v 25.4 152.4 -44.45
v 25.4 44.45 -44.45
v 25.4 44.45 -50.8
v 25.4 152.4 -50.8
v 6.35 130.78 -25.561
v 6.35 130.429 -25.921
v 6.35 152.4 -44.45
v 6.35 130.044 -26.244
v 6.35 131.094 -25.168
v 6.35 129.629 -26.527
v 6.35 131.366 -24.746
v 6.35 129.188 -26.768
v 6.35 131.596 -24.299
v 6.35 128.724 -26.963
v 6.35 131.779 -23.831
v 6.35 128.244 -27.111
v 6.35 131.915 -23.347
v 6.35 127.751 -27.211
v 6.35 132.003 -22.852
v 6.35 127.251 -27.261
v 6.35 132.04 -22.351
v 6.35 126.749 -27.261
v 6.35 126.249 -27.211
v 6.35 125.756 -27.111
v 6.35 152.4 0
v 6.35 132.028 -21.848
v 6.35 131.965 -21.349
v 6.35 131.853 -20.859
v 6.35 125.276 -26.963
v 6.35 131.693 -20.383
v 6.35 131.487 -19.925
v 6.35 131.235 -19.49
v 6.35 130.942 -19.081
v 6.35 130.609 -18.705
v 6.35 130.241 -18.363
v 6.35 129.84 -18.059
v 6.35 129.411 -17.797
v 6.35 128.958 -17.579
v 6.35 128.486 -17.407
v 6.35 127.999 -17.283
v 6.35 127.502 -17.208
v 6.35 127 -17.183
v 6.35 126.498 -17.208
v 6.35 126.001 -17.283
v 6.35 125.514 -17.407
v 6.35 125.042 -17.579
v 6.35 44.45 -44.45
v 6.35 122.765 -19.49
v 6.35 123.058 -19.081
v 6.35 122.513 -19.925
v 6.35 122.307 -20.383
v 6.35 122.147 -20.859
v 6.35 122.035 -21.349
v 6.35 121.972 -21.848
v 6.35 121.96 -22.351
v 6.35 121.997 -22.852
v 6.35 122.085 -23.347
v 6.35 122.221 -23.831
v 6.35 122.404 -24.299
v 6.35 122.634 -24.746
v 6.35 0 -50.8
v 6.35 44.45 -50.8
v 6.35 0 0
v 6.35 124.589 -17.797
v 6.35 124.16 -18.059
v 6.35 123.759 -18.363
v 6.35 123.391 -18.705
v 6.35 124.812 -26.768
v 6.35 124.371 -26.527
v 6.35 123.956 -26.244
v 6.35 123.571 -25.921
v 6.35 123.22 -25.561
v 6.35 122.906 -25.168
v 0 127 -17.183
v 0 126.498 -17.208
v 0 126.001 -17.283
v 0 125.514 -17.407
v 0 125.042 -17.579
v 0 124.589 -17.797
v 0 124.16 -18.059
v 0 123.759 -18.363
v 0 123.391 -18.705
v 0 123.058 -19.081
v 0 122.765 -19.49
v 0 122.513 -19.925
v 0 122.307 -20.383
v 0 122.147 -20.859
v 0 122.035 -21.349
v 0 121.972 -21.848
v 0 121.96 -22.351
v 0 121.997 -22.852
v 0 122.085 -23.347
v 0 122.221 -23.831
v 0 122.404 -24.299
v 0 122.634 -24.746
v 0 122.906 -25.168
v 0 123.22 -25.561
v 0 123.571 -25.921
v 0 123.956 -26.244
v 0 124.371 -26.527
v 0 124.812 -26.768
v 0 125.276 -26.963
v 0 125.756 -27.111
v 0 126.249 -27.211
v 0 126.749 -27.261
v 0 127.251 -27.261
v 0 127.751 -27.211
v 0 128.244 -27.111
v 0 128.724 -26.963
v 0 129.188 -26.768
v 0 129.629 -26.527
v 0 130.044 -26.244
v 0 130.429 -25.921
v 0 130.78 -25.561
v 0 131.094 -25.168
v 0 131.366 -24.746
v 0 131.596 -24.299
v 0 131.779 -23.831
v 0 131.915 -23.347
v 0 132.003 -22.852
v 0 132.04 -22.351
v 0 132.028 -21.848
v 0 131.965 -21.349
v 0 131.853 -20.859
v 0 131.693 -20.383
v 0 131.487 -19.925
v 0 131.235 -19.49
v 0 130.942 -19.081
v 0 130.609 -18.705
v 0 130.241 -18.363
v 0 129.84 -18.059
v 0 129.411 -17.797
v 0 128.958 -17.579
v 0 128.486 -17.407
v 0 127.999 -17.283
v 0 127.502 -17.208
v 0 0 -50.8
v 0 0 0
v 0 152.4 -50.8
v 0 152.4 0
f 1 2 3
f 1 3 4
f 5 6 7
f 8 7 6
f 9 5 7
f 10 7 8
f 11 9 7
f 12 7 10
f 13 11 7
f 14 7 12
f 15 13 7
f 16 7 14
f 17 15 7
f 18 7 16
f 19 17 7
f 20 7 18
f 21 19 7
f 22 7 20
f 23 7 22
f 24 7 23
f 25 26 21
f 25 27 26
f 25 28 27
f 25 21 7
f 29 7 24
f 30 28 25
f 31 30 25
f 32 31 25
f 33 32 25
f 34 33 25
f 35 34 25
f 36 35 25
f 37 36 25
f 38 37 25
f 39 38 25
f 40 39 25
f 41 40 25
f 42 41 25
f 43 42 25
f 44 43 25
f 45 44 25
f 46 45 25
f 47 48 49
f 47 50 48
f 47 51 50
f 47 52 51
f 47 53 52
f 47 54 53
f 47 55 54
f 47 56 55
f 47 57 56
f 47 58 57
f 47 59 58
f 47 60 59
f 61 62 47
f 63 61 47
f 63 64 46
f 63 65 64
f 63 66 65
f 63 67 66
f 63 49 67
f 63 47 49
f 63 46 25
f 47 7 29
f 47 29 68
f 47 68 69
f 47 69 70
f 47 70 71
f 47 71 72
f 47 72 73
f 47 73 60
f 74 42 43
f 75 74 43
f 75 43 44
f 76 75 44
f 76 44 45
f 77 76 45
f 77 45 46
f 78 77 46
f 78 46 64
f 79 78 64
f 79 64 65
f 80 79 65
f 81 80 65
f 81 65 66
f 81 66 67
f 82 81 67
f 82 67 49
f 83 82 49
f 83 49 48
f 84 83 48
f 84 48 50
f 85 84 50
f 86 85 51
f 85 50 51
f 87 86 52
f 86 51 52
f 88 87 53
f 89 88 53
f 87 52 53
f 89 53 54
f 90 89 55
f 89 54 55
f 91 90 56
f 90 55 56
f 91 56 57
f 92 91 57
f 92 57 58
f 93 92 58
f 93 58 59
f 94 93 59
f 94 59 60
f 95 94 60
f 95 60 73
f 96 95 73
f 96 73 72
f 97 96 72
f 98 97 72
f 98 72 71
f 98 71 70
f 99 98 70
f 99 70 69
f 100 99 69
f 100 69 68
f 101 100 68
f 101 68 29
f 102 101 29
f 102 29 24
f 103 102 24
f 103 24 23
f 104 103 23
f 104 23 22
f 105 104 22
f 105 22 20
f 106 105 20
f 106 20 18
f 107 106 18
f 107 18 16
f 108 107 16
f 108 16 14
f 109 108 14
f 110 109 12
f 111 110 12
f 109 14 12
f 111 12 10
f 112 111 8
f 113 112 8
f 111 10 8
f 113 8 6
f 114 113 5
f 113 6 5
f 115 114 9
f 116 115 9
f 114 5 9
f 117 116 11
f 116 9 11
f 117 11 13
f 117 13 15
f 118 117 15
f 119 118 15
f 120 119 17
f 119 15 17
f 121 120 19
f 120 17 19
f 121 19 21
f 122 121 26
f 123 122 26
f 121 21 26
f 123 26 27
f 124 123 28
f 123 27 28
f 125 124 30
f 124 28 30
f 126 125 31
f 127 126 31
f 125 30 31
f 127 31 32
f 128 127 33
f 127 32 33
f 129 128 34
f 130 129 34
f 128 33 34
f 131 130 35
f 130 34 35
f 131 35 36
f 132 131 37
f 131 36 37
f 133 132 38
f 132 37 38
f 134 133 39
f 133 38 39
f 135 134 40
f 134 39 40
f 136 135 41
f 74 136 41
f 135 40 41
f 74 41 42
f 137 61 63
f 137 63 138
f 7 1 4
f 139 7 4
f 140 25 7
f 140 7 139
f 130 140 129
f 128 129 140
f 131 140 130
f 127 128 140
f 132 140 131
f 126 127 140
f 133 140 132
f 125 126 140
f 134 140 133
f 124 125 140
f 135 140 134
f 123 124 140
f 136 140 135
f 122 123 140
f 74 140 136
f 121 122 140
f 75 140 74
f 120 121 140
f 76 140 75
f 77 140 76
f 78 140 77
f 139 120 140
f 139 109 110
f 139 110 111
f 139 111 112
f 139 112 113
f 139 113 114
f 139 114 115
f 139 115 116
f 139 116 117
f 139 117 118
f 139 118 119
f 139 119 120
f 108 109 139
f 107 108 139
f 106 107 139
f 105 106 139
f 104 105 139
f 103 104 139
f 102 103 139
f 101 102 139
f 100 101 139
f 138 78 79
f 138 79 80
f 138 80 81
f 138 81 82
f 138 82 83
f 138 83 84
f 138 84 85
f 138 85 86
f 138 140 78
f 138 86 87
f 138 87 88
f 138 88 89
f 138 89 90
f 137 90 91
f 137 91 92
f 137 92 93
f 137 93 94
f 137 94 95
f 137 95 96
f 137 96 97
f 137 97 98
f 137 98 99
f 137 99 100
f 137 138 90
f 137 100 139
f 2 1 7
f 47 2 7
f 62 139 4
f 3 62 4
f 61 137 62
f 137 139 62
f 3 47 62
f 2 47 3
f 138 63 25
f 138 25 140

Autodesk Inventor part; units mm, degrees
ref_plane "YZ Plane" through (0, 0, 0) normal (1, 0, 0) x (0, 1, 0)
ref_plane "XZ Plane" through (0, 0, 0) normal (0, 1, 0) x (-1, 0, 0)
ref_plane "XY Plane" through (0, 0, 0) normal (0, 0, 1) x (1, 0, 0)
sketch "Sketch1" plane through (0, 0, 0) normal (0, 1, 0) x (-1, 0, 0)
  line L0 (0, 0) -> (0, -50.8)
  line L1 (0, -50.8) -> (-50.8, -50.8)
  line L2 (-50.8, -50.8) -> (-50.8, -44.45)
  line L3 (-50.8, -44.45) -> (-6.35, -44.45)
  line L4 (-6.35, -44.45) -> (-6.35, 0)
  line L5 (-6.35, 0) -> (0, 0)
  dimension "d0" = 6.35
  dimension "d1" = 50.8
extrude "Extrusion1" add sketch "Sketch1" along normal blind 152.4
sketch "Sketch4" plane through (6.35, 0, -44.45) normal (0, 0, 1) x (1, 0, 0)
  line L0 (44.45, 0) -> (0, 0) projected
  line L1 (0, 0) -> (0, 152.4) projected
  line L2 (44.45, 0) -> (0, 0)
  line L3 (0, 0) -> (0, 44.45)
  line L4 (0, 44.45) -> (44.45, 44.45)
  line L5 (44.45, 44.45) -> (44.45, 0)
  point P0 (-6.35, 0)
  dimension "d8" = 44.45
extrude "Extrusion3" cut sketch "Sketch4" against normal through all
sketch "Sketch5" plane through (6.35, 152.4, -44.45) normal (0, 0, 1) x (1, 0, 0)
  line L0 (44.45, -107.95) -> (44.45, 0) projected
  line L1 (44.45, 0) -> (-6.35, 0) projected
  line L2 (44.45, -107.95) -> (19.05, -107.95)
  line L3 (19.05, -107.95) -> (19.05, 0)
  line L4 (19.05, 0) -> (44.45, 0)
  line L5 (44.45, 0) -> (44.45, -107.95)
  point P0 (-6.35, -152.4)
  dimension "d11" = 25.4
extrude "Extrusion4" cut sketch "Sketch5" against normal through all
sketch "Sketch6" plane through (0, 0, -50.8) normal (-1, 0, 0) x (0, 0, 1)
  line L0 (0, 152.4) -> (50.8, 152.4) projected
  line L1 (0, 0) -> (0, 152.4) projected
  line L2 (50.8, 0) -> (50.8, 152.4) projected
  point P0 (28.575, 127)
  dimension "d14" = 25.4
  dimension "d23" = 22.225
hole "Hole1" at (0, 127, -22.225) direction (1, 0, 0) diameter 10.0838 end through all clearance for "Flat Head Machine Screw (82)" size "3/8" standard "Ansi Unified Screw Threads"
properties part number "LiftAngleBracketExtensionRight" material "Aluminum 6061"
